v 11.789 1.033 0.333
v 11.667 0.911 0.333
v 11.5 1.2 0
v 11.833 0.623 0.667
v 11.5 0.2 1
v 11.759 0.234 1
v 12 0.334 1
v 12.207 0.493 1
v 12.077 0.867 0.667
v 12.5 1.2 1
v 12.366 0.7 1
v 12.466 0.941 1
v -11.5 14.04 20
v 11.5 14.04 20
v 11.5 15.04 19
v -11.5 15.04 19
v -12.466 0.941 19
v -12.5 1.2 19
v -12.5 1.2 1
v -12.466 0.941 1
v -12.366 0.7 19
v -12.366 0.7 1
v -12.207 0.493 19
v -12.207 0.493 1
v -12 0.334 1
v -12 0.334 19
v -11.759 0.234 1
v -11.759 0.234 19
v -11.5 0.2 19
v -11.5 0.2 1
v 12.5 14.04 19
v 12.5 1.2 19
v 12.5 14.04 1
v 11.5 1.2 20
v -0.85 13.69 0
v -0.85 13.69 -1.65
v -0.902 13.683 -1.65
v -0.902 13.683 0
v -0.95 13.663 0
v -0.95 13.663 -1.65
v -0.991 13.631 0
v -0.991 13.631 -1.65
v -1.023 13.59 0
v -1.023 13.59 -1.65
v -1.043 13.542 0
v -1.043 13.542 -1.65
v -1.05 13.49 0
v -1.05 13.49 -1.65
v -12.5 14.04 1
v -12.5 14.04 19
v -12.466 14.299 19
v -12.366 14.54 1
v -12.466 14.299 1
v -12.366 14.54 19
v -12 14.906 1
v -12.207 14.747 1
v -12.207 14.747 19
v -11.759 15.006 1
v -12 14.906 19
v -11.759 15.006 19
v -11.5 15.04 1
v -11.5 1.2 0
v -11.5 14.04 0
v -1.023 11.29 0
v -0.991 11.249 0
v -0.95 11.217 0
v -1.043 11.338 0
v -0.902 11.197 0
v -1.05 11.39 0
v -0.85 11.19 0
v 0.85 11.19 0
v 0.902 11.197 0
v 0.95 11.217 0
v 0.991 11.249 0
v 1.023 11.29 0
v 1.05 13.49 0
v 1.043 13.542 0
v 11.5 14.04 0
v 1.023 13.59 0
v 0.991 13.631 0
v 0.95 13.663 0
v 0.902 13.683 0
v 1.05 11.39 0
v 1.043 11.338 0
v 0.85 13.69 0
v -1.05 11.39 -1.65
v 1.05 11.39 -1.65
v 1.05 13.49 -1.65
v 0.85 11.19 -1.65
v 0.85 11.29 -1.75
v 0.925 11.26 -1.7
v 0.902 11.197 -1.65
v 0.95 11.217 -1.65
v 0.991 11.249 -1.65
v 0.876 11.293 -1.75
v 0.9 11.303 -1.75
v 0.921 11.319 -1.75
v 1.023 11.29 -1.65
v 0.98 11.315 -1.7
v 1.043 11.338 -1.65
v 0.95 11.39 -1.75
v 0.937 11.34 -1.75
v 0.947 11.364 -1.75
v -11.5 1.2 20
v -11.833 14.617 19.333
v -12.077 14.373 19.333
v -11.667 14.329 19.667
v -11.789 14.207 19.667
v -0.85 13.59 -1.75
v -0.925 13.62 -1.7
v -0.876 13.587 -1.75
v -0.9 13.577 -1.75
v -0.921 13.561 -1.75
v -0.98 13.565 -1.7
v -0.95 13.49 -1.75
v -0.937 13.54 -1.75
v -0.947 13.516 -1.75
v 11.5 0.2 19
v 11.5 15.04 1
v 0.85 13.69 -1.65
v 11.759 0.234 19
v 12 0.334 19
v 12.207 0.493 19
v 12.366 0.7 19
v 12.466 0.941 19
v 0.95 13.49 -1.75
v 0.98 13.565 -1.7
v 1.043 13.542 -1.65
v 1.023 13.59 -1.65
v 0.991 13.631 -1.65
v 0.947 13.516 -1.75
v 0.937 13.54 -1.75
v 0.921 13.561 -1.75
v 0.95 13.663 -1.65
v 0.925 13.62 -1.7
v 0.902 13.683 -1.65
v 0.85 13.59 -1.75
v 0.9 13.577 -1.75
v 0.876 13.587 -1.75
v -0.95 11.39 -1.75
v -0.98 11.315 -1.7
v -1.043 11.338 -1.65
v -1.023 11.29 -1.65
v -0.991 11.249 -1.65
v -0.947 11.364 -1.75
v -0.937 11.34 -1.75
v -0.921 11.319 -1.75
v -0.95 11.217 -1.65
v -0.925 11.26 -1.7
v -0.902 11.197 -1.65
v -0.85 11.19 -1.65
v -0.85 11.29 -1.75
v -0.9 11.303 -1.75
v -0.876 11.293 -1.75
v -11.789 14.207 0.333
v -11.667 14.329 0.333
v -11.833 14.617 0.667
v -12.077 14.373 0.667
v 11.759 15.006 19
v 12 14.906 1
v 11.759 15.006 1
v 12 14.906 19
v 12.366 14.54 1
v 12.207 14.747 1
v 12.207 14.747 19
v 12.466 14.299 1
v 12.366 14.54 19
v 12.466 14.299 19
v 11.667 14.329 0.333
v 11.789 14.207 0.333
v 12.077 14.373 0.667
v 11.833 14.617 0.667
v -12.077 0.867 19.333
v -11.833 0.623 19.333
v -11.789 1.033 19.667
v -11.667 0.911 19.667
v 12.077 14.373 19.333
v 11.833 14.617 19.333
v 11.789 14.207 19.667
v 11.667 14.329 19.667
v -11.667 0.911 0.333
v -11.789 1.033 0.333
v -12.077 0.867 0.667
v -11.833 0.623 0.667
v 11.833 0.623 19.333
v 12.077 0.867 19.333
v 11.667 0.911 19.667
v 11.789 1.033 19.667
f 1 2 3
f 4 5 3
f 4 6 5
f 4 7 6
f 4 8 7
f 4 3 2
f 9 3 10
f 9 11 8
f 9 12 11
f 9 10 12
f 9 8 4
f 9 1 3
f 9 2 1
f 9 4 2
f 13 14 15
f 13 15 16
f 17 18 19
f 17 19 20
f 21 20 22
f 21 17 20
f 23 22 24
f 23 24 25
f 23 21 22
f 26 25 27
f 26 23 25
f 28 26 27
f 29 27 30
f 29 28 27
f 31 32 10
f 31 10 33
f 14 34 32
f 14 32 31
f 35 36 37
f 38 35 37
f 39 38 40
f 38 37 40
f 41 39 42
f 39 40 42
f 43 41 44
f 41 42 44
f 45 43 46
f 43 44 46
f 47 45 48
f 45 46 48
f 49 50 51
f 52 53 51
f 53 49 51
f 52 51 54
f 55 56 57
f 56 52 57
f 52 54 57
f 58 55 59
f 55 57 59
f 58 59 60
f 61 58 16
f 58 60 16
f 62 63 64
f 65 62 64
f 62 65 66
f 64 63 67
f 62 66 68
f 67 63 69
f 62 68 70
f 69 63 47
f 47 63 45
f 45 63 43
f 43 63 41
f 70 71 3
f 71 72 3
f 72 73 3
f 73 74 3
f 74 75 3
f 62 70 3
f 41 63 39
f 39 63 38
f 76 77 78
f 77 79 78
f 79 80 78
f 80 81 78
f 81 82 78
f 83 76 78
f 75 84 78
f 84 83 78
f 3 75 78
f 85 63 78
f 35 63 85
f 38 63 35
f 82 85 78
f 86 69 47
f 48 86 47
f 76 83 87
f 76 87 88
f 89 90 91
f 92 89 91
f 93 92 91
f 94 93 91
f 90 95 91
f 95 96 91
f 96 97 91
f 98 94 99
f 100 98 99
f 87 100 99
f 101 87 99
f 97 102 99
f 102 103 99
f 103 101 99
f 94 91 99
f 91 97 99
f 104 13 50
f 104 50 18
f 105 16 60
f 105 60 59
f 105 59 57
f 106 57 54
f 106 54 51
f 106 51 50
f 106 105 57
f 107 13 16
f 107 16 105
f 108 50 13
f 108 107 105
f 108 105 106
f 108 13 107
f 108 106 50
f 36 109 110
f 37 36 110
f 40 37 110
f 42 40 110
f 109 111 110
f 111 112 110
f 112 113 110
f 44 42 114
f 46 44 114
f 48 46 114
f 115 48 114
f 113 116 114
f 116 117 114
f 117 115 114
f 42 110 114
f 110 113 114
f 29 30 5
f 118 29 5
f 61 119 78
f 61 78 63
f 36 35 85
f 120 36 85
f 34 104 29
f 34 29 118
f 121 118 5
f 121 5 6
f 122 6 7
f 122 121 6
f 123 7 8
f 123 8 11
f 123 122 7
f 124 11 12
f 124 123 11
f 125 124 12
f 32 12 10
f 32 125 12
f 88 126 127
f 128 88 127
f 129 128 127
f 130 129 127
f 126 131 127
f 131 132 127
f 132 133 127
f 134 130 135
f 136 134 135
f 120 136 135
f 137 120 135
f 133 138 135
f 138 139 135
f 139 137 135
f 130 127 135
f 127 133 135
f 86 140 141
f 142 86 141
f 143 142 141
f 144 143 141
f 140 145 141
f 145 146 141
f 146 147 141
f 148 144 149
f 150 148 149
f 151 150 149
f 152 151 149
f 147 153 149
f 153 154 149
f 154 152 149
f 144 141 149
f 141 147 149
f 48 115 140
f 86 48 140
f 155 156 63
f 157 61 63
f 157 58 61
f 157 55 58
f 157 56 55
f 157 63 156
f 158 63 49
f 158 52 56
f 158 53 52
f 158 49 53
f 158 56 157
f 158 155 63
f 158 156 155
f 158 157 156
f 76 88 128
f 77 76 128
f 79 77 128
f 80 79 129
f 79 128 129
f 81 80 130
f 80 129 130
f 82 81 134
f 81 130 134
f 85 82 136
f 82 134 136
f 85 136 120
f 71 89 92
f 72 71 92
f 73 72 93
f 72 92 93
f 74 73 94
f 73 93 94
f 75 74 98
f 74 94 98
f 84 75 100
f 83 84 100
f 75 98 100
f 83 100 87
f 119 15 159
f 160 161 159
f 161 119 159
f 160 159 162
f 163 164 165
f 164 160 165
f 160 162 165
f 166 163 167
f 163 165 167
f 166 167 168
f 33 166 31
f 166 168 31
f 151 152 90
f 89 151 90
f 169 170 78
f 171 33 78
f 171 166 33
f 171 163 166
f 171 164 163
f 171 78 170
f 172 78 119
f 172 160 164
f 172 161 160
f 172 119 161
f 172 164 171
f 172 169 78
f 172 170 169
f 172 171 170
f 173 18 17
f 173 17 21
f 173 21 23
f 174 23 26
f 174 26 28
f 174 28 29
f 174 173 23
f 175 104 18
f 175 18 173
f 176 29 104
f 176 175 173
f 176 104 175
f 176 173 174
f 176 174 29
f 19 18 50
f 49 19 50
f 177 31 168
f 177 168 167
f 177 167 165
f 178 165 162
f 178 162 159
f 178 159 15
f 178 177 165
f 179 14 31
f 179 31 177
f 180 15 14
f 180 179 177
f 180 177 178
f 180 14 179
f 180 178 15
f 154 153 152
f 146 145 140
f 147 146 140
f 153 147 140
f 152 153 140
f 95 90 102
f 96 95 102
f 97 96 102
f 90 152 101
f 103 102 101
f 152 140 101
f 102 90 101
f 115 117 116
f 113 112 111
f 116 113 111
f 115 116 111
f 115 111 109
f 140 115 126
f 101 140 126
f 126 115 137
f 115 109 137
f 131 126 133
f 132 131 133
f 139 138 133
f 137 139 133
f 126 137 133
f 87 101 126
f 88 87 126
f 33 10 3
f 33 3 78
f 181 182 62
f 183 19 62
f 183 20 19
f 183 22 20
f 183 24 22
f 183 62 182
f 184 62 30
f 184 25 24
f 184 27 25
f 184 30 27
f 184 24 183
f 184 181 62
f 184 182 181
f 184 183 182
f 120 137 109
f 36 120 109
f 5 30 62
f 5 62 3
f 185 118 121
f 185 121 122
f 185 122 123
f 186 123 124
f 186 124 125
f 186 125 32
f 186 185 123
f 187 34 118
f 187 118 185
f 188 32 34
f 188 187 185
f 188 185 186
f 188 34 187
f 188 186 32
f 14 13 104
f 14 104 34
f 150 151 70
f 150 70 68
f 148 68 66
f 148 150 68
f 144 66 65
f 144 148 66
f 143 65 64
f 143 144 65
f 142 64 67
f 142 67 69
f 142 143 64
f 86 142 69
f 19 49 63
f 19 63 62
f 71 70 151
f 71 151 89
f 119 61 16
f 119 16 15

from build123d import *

# Parameters (mm, degrees)
MAIN_FEATURES_W        = 2.1
MAIN_FEATURES_H        = 2.5
PEG_DEPTH              = 1.75
SKETCH1_3_W            = 25
SKETCH1_3_H            = 14.84
BLOCK_DEPTH            = 20
ROUNDED_PEG_EDGES_R    = 0.2
ROUNDED_BLOCK_EDGES_R  = 1
BREAK_PEG_EDGES_SIZE   = 0.1
BREAK_BLOCK_EDGES_SIZE = 1


with BuildPart() as part:
    # main_features → peg (new body)
    with BuildSketch(Plane.XY):
        with Locations((0, 12.44)):
            Rectangle(MAIN_FEATURES_W, MAIN_FEATURES_H)
    extrude(amount=-PEG_DEPTH)

    # Sketch1<3> → block (add)
    with BuildSketch(Plane.XY):
        with Locations((0, 7.62)):
            Rectangle(SKETCH1_3_W, SKETCH1_3_H)
    extrude(amount=BLOCK_DEPTH)

    # rounded_peg_edges
    rounded_peg_edges_edges = [part.edges().sort_by_distance(p)[0] for p in [
        (-1.05, 11.19, -0.875),
        (1.05, 11.19, -0.875),
        (1.05, 13.69, -0.875),
        (-1.05, 13.69, -0.875),
    ]]
    fillet(rounded_peg_edges_edges, radius=ROUNDED_PEG_EDGES_R)

    # rounded_block_edges
    rounded_block_edges_edges = [part.edges().sort_by_distance(p)[0] for p in [
        (-12.5, 0.2, 10),
        (12.5, 0.2, 10),
        (12.5, 15.04, 10),
        (-12.5, 15.04, 10),
    ]]
    fillet(rounded_block_edges_edges, radius=ROUNDED_BLOCK_EDGES_R)

    # break_peg_edges
    break_peg_edges_edges = [part.edges().sort_by_distance(p)[0] for p in [
        (0, 11.19, -1.75),
        (1.05, 12.44, -1.75),
        (0, 13.69, -1.75),
        (-1.05, 12.44, -1.75),
        (-0.991421356, 13.631421356, -1.75),
        (-0.991421356, 11.248578644, -1.75),
        (0.991421356, 13.631421356, -1.75),
        (0.991421356, 11.248578644, -1.75),
    ]]
    chamfer(break_peg_edges_edges, length=BREAK_PEG_EDGES_SIZE)

    # break_block_edges
    break_block_edges_edges = [part.edges().sort_by_distance(p)[0] for p in [
        (12.5, 7.62, 0),
        (12.5, 7.62, 20),
        (0, 0.2, 0),
        (-12.5, 7.62, 0),
        (0, 15.04, 0),
        (-12.207106781, 0.492893219, 0),
        (-12.207106781, 14.747106781, 0),
        (12.207106781, 14.747106781, 0),
        (12.207106781, 0.492893219, 0),
        (0, 0.2, 20),
        (0, 15.04, 20),
        (-12.5, 7.62, 20),
        (-12.207106781, 0.492893219, 20),
        (-12.207106781, 14.747106781, 20),
        (12.207106781, 14.747106781, 20),
        (12.207106781, 0.492893219, 20),
    ]]
    chamfer(break_block_edges_edges, length=BREAK_BLOCK_EDGES_SIZE)


solid = part.part
